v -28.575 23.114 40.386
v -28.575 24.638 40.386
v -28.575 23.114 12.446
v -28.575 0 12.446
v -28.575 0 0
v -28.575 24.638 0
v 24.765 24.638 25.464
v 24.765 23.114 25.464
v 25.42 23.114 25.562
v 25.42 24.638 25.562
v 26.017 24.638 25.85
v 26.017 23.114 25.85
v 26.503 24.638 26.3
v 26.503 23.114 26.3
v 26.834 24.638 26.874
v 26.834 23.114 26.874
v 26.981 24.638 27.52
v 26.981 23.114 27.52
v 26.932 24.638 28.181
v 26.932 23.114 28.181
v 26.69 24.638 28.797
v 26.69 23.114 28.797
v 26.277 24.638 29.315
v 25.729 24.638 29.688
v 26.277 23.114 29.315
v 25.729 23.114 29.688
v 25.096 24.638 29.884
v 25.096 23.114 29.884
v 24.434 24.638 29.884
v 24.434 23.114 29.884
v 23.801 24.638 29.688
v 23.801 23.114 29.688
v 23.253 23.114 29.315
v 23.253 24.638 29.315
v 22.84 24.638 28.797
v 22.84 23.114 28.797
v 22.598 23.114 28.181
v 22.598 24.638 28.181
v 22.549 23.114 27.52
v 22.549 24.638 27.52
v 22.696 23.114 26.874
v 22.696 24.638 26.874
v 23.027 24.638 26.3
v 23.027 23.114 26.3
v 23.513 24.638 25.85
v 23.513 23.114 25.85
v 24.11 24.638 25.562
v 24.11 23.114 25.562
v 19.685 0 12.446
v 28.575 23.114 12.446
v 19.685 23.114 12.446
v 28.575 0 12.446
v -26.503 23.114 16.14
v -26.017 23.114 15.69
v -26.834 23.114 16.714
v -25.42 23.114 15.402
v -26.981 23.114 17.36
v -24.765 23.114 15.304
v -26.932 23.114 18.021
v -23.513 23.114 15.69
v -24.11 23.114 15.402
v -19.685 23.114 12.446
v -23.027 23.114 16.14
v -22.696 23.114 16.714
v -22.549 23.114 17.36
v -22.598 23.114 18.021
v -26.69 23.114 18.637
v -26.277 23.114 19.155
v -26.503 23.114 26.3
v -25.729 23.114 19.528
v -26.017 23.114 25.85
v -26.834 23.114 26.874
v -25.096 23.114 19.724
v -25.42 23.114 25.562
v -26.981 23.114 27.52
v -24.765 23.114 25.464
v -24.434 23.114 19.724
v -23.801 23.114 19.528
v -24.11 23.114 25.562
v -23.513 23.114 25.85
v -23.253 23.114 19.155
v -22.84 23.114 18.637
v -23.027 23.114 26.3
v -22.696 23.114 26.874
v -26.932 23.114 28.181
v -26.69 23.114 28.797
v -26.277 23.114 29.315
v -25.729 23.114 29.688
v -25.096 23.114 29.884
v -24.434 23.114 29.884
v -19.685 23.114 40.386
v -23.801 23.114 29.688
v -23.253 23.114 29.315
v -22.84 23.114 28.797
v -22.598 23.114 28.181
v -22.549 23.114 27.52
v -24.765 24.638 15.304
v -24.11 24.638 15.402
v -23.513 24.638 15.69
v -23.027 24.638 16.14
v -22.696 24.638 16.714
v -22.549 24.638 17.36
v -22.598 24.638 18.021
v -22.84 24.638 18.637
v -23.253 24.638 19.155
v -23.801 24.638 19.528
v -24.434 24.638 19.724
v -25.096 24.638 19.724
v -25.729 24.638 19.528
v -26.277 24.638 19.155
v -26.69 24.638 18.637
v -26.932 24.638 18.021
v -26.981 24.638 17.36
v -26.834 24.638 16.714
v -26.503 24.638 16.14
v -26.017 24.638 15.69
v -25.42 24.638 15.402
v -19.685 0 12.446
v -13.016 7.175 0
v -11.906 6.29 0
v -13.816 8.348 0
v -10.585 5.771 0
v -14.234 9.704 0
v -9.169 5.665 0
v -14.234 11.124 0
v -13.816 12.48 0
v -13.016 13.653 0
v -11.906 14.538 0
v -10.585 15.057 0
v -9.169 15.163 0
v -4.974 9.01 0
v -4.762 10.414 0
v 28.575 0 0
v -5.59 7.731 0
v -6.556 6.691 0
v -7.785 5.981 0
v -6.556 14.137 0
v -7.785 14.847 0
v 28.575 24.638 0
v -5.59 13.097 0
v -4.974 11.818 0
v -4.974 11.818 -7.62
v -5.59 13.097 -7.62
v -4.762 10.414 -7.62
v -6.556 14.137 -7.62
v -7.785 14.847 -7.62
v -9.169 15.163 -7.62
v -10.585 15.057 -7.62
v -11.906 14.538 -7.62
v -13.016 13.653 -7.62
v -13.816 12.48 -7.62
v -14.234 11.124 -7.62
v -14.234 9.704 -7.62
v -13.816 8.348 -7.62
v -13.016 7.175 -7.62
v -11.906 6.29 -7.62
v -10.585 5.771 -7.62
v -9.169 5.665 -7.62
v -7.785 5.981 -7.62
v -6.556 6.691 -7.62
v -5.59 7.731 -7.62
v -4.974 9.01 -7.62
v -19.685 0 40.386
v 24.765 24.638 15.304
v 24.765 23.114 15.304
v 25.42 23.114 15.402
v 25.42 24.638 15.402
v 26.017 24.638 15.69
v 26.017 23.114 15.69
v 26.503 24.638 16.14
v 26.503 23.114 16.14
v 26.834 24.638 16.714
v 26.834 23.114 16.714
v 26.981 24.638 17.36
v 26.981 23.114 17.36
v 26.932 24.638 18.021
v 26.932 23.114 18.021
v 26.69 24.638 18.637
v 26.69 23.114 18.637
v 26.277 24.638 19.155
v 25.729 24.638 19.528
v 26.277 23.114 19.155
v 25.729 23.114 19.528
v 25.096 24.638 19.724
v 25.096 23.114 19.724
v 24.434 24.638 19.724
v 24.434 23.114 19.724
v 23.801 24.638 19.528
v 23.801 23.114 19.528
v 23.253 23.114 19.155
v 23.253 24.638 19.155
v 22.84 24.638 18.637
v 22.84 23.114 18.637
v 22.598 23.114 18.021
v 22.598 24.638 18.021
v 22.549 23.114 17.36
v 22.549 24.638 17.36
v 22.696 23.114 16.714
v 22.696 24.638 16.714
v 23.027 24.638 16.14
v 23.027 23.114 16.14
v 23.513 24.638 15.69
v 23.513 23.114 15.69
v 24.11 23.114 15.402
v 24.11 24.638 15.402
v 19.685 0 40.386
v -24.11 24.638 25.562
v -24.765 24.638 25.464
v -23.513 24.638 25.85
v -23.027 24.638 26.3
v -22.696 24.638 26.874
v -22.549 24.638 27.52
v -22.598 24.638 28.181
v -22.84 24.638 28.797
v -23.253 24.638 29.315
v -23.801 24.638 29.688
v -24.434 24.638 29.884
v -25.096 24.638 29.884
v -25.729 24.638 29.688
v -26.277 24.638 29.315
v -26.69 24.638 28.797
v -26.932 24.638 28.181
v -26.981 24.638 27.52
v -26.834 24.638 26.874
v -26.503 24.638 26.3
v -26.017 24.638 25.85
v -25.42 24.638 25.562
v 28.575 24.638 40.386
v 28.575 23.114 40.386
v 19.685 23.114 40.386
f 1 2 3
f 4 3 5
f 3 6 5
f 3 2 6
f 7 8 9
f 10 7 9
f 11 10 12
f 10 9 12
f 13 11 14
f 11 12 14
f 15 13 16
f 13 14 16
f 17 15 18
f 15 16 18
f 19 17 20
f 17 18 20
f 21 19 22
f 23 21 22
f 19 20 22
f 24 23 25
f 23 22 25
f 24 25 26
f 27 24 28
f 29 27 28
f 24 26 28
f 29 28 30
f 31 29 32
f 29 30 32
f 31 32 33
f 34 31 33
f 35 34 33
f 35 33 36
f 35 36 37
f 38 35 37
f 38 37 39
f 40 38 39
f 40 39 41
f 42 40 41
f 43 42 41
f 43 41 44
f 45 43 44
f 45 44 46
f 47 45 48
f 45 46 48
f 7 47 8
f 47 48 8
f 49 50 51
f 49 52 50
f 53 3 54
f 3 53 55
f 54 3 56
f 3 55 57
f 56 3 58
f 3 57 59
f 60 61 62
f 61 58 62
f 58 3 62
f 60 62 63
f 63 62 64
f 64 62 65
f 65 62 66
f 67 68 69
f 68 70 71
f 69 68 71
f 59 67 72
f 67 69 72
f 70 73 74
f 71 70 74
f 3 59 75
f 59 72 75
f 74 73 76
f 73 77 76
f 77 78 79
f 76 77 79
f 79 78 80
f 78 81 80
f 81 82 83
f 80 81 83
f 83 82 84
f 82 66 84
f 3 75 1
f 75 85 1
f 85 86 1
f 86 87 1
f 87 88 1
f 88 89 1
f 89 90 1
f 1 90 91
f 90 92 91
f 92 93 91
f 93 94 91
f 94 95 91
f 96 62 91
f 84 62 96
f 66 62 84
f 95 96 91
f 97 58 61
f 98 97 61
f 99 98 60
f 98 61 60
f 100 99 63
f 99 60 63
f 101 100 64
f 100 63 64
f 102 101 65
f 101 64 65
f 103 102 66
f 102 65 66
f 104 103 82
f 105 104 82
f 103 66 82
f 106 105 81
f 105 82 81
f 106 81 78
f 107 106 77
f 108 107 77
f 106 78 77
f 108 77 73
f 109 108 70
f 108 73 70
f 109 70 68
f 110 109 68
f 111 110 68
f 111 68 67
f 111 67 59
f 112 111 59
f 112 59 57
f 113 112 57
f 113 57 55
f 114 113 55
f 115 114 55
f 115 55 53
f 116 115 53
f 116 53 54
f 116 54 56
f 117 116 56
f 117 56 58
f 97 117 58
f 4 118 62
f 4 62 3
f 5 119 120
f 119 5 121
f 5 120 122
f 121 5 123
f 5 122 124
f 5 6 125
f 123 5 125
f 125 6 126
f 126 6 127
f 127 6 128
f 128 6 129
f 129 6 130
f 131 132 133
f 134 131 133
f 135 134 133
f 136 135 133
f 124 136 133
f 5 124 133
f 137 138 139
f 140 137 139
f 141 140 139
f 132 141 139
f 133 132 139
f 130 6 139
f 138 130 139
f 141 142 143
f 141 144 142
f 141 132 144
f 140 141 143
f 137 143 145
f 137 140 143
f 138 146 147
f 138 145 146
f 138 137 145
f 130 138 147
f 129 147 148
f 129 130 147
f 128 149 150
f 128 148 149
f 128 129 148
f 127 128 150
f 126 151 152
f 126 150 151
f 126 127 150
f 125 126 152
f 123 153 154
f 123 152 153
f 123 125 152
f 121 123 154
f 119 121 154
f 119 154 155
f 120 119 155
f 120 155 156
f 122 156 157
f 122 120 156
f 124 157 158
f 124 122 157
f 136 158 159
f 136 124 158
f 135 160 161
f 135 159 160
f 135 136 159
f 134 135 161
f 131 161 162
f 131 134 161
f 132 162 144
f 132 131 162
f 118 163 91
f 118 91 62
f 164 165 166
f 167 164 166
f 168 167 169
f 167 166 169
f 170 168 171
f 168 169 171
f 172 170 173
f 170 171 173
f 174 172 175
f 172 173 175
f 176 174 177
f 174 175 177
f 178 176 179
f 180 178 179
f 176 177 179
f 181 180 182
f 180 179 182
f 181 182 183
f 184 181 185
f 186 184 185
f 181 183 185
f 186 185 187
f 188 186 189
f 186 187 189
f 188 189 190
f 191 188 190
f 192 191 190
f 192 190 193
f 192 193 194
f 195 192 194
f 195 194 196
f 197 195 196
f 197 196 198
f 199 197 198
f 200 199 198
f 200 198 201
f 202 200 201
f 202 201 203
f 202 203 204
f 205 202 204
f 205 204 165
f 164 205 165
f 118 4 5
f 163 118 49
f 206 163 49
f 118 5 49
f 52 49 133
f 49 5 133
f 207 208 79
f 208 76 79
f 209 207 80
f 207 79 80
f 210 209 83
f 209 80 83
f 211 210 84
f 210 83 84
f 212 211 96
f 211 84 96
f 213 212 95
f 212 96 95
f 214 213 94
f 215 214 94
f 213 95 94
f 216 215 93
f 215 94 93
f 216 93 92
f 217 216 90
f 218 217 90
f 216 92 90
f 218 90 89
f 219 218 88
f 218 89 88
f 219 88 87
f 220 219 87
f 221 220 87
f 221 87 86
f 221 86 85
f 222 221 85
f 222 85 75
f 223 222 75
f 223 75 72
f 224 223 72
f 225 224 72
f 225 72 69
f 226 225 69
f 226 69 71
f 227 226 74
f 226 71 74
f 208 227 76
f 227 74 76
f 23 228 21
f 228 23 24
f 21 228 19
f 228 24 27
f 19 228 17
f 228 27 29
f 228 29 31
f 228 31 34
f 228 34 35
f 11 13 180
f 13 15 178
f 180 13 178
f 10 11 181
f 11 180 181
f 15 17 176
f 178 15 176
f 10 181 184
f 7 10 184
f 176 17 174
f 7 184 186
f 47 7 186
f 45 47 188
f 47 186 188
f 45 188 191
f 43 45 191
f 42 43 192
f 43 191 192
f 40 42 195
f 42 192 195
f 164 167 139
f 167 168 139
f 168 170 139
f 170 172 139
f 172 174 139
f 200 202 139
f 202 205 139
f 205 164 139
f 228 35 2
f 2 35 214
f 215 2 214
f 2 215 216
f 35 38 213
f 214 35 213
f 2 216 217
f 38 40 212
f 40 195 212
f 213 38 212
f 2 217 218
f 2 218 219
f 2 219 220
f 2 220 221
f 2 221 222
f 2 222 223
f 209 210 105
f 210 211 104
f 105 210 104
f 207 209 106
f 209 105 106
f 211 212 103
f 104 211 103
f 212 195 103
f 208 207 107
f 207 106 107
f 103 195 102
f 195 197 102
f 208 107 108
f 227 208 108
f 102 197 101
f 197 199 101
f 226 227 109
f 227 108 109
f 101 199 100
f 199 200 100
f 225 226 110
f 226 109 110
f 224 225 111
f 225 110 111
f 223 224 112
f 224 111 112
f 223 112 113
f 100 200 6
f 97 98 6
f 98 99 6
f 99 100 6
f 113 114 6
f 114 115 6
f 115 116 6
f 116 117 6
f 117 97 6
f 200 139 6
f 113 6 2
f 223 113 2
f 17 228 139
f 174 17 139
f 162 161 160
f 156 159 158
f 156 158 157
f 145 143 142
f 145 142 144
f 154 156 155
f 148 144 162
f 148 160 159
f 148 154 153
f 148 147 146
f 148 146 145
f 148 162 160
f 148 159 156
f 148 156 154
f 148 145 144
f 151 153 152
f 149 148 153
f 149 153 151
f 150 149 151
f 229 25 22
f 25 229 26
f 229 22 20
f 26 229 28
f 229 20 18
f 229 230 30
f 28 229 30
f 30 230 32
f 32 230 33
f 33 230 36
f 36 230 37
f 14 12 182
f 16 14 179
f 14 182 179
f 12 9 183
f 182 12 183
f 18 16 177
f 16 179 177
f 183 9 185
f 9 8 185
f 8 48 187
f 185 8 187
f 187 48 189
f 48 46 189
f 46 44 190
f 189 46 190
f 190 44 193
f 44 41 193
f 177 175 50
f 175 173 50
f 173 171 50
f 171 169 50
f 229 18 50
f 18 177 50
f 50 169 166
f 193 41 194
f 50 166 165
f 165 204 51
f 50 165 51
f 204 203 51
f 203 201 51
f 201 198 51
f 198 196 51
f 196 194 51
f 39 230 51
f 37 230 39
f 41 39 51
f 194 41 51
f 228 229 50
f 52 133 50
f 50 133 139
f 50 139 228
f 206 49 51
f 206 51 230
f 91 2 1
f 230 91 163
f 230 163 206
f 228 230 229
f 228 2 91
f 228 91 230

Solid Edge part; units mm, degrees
sketch "Sketch1" plane through (0, 0, 0) normal (0, 0, 1) x (1, 0, 0)
  line L0 (-28.575, 0) -> (28.575, 0)
  line L1 (28.575, 0) -> (28.575, 24.638)
  line L2 (28.575, 24.638) -> (-28.575, 24.638)
  line L3 (-28.575, 24.638) -> (-28.575, 0)
  dimension "D1" = 57.15
  dimension "D2" = 24.638
extrude "Protrusion1" add sketch "Sketch1" along normal blind 40.386
sketch "Sketch2" plane through (0, 12.319, 0) normal (0, 0, -1) x (1, 0, 0)
  circle A0 centre (-9.525, 1.905) radius 4.7625
  dimension "D1" = 9.525
  dimension "D2" = 19.05
  dimension "D3" = 14.224
extrude "ExtrudedProtrusion_2" add sketch "Sketch2" along normal blind 7.62
sketch "Sketch3" plane through (0, 0, 20.193) normal (0, -1, 0) x (1, 0, 0)
  line L0 (-28.575, 20.193) -> (-19.685, 20.193)
  line L1 (-19.685, 20.193) -> (-19.685, -7.747)
  line L2 (-19.685, -7.747) -> (-28.575, -7.747)
  line L3 (-28.575, -7.747) -> (-28.575, 20.193)
  dimension "D1" = 27.94
  dimension "D2" = 8.89
extrude "ExtrudedCutout_1" cut sketch "Sketch3" against normal blind 23.114
mirror "Mirror1" about plane through (0, 0, 0) normal (1, 0, 0) of "ExtrudedCutout_1"
hole "Hole_1" at (-24.765, 23.114, 17.526) direction (0, 1, 0) diameter 4.445 end up to next
hole "Hole1" at (24.765, 23.114, 17.526) direction (0, 1, 0) diameter 4.445 end up to next
hole "Hole2" at (24.765, 23.114, 27.686) direction (0, 1, 0) diameter 4.445 end up to next
hole "Hole3" at (-24.765, 23.114, 27.686) direction (0, 1, 0) diameter 4.445 end up to next
